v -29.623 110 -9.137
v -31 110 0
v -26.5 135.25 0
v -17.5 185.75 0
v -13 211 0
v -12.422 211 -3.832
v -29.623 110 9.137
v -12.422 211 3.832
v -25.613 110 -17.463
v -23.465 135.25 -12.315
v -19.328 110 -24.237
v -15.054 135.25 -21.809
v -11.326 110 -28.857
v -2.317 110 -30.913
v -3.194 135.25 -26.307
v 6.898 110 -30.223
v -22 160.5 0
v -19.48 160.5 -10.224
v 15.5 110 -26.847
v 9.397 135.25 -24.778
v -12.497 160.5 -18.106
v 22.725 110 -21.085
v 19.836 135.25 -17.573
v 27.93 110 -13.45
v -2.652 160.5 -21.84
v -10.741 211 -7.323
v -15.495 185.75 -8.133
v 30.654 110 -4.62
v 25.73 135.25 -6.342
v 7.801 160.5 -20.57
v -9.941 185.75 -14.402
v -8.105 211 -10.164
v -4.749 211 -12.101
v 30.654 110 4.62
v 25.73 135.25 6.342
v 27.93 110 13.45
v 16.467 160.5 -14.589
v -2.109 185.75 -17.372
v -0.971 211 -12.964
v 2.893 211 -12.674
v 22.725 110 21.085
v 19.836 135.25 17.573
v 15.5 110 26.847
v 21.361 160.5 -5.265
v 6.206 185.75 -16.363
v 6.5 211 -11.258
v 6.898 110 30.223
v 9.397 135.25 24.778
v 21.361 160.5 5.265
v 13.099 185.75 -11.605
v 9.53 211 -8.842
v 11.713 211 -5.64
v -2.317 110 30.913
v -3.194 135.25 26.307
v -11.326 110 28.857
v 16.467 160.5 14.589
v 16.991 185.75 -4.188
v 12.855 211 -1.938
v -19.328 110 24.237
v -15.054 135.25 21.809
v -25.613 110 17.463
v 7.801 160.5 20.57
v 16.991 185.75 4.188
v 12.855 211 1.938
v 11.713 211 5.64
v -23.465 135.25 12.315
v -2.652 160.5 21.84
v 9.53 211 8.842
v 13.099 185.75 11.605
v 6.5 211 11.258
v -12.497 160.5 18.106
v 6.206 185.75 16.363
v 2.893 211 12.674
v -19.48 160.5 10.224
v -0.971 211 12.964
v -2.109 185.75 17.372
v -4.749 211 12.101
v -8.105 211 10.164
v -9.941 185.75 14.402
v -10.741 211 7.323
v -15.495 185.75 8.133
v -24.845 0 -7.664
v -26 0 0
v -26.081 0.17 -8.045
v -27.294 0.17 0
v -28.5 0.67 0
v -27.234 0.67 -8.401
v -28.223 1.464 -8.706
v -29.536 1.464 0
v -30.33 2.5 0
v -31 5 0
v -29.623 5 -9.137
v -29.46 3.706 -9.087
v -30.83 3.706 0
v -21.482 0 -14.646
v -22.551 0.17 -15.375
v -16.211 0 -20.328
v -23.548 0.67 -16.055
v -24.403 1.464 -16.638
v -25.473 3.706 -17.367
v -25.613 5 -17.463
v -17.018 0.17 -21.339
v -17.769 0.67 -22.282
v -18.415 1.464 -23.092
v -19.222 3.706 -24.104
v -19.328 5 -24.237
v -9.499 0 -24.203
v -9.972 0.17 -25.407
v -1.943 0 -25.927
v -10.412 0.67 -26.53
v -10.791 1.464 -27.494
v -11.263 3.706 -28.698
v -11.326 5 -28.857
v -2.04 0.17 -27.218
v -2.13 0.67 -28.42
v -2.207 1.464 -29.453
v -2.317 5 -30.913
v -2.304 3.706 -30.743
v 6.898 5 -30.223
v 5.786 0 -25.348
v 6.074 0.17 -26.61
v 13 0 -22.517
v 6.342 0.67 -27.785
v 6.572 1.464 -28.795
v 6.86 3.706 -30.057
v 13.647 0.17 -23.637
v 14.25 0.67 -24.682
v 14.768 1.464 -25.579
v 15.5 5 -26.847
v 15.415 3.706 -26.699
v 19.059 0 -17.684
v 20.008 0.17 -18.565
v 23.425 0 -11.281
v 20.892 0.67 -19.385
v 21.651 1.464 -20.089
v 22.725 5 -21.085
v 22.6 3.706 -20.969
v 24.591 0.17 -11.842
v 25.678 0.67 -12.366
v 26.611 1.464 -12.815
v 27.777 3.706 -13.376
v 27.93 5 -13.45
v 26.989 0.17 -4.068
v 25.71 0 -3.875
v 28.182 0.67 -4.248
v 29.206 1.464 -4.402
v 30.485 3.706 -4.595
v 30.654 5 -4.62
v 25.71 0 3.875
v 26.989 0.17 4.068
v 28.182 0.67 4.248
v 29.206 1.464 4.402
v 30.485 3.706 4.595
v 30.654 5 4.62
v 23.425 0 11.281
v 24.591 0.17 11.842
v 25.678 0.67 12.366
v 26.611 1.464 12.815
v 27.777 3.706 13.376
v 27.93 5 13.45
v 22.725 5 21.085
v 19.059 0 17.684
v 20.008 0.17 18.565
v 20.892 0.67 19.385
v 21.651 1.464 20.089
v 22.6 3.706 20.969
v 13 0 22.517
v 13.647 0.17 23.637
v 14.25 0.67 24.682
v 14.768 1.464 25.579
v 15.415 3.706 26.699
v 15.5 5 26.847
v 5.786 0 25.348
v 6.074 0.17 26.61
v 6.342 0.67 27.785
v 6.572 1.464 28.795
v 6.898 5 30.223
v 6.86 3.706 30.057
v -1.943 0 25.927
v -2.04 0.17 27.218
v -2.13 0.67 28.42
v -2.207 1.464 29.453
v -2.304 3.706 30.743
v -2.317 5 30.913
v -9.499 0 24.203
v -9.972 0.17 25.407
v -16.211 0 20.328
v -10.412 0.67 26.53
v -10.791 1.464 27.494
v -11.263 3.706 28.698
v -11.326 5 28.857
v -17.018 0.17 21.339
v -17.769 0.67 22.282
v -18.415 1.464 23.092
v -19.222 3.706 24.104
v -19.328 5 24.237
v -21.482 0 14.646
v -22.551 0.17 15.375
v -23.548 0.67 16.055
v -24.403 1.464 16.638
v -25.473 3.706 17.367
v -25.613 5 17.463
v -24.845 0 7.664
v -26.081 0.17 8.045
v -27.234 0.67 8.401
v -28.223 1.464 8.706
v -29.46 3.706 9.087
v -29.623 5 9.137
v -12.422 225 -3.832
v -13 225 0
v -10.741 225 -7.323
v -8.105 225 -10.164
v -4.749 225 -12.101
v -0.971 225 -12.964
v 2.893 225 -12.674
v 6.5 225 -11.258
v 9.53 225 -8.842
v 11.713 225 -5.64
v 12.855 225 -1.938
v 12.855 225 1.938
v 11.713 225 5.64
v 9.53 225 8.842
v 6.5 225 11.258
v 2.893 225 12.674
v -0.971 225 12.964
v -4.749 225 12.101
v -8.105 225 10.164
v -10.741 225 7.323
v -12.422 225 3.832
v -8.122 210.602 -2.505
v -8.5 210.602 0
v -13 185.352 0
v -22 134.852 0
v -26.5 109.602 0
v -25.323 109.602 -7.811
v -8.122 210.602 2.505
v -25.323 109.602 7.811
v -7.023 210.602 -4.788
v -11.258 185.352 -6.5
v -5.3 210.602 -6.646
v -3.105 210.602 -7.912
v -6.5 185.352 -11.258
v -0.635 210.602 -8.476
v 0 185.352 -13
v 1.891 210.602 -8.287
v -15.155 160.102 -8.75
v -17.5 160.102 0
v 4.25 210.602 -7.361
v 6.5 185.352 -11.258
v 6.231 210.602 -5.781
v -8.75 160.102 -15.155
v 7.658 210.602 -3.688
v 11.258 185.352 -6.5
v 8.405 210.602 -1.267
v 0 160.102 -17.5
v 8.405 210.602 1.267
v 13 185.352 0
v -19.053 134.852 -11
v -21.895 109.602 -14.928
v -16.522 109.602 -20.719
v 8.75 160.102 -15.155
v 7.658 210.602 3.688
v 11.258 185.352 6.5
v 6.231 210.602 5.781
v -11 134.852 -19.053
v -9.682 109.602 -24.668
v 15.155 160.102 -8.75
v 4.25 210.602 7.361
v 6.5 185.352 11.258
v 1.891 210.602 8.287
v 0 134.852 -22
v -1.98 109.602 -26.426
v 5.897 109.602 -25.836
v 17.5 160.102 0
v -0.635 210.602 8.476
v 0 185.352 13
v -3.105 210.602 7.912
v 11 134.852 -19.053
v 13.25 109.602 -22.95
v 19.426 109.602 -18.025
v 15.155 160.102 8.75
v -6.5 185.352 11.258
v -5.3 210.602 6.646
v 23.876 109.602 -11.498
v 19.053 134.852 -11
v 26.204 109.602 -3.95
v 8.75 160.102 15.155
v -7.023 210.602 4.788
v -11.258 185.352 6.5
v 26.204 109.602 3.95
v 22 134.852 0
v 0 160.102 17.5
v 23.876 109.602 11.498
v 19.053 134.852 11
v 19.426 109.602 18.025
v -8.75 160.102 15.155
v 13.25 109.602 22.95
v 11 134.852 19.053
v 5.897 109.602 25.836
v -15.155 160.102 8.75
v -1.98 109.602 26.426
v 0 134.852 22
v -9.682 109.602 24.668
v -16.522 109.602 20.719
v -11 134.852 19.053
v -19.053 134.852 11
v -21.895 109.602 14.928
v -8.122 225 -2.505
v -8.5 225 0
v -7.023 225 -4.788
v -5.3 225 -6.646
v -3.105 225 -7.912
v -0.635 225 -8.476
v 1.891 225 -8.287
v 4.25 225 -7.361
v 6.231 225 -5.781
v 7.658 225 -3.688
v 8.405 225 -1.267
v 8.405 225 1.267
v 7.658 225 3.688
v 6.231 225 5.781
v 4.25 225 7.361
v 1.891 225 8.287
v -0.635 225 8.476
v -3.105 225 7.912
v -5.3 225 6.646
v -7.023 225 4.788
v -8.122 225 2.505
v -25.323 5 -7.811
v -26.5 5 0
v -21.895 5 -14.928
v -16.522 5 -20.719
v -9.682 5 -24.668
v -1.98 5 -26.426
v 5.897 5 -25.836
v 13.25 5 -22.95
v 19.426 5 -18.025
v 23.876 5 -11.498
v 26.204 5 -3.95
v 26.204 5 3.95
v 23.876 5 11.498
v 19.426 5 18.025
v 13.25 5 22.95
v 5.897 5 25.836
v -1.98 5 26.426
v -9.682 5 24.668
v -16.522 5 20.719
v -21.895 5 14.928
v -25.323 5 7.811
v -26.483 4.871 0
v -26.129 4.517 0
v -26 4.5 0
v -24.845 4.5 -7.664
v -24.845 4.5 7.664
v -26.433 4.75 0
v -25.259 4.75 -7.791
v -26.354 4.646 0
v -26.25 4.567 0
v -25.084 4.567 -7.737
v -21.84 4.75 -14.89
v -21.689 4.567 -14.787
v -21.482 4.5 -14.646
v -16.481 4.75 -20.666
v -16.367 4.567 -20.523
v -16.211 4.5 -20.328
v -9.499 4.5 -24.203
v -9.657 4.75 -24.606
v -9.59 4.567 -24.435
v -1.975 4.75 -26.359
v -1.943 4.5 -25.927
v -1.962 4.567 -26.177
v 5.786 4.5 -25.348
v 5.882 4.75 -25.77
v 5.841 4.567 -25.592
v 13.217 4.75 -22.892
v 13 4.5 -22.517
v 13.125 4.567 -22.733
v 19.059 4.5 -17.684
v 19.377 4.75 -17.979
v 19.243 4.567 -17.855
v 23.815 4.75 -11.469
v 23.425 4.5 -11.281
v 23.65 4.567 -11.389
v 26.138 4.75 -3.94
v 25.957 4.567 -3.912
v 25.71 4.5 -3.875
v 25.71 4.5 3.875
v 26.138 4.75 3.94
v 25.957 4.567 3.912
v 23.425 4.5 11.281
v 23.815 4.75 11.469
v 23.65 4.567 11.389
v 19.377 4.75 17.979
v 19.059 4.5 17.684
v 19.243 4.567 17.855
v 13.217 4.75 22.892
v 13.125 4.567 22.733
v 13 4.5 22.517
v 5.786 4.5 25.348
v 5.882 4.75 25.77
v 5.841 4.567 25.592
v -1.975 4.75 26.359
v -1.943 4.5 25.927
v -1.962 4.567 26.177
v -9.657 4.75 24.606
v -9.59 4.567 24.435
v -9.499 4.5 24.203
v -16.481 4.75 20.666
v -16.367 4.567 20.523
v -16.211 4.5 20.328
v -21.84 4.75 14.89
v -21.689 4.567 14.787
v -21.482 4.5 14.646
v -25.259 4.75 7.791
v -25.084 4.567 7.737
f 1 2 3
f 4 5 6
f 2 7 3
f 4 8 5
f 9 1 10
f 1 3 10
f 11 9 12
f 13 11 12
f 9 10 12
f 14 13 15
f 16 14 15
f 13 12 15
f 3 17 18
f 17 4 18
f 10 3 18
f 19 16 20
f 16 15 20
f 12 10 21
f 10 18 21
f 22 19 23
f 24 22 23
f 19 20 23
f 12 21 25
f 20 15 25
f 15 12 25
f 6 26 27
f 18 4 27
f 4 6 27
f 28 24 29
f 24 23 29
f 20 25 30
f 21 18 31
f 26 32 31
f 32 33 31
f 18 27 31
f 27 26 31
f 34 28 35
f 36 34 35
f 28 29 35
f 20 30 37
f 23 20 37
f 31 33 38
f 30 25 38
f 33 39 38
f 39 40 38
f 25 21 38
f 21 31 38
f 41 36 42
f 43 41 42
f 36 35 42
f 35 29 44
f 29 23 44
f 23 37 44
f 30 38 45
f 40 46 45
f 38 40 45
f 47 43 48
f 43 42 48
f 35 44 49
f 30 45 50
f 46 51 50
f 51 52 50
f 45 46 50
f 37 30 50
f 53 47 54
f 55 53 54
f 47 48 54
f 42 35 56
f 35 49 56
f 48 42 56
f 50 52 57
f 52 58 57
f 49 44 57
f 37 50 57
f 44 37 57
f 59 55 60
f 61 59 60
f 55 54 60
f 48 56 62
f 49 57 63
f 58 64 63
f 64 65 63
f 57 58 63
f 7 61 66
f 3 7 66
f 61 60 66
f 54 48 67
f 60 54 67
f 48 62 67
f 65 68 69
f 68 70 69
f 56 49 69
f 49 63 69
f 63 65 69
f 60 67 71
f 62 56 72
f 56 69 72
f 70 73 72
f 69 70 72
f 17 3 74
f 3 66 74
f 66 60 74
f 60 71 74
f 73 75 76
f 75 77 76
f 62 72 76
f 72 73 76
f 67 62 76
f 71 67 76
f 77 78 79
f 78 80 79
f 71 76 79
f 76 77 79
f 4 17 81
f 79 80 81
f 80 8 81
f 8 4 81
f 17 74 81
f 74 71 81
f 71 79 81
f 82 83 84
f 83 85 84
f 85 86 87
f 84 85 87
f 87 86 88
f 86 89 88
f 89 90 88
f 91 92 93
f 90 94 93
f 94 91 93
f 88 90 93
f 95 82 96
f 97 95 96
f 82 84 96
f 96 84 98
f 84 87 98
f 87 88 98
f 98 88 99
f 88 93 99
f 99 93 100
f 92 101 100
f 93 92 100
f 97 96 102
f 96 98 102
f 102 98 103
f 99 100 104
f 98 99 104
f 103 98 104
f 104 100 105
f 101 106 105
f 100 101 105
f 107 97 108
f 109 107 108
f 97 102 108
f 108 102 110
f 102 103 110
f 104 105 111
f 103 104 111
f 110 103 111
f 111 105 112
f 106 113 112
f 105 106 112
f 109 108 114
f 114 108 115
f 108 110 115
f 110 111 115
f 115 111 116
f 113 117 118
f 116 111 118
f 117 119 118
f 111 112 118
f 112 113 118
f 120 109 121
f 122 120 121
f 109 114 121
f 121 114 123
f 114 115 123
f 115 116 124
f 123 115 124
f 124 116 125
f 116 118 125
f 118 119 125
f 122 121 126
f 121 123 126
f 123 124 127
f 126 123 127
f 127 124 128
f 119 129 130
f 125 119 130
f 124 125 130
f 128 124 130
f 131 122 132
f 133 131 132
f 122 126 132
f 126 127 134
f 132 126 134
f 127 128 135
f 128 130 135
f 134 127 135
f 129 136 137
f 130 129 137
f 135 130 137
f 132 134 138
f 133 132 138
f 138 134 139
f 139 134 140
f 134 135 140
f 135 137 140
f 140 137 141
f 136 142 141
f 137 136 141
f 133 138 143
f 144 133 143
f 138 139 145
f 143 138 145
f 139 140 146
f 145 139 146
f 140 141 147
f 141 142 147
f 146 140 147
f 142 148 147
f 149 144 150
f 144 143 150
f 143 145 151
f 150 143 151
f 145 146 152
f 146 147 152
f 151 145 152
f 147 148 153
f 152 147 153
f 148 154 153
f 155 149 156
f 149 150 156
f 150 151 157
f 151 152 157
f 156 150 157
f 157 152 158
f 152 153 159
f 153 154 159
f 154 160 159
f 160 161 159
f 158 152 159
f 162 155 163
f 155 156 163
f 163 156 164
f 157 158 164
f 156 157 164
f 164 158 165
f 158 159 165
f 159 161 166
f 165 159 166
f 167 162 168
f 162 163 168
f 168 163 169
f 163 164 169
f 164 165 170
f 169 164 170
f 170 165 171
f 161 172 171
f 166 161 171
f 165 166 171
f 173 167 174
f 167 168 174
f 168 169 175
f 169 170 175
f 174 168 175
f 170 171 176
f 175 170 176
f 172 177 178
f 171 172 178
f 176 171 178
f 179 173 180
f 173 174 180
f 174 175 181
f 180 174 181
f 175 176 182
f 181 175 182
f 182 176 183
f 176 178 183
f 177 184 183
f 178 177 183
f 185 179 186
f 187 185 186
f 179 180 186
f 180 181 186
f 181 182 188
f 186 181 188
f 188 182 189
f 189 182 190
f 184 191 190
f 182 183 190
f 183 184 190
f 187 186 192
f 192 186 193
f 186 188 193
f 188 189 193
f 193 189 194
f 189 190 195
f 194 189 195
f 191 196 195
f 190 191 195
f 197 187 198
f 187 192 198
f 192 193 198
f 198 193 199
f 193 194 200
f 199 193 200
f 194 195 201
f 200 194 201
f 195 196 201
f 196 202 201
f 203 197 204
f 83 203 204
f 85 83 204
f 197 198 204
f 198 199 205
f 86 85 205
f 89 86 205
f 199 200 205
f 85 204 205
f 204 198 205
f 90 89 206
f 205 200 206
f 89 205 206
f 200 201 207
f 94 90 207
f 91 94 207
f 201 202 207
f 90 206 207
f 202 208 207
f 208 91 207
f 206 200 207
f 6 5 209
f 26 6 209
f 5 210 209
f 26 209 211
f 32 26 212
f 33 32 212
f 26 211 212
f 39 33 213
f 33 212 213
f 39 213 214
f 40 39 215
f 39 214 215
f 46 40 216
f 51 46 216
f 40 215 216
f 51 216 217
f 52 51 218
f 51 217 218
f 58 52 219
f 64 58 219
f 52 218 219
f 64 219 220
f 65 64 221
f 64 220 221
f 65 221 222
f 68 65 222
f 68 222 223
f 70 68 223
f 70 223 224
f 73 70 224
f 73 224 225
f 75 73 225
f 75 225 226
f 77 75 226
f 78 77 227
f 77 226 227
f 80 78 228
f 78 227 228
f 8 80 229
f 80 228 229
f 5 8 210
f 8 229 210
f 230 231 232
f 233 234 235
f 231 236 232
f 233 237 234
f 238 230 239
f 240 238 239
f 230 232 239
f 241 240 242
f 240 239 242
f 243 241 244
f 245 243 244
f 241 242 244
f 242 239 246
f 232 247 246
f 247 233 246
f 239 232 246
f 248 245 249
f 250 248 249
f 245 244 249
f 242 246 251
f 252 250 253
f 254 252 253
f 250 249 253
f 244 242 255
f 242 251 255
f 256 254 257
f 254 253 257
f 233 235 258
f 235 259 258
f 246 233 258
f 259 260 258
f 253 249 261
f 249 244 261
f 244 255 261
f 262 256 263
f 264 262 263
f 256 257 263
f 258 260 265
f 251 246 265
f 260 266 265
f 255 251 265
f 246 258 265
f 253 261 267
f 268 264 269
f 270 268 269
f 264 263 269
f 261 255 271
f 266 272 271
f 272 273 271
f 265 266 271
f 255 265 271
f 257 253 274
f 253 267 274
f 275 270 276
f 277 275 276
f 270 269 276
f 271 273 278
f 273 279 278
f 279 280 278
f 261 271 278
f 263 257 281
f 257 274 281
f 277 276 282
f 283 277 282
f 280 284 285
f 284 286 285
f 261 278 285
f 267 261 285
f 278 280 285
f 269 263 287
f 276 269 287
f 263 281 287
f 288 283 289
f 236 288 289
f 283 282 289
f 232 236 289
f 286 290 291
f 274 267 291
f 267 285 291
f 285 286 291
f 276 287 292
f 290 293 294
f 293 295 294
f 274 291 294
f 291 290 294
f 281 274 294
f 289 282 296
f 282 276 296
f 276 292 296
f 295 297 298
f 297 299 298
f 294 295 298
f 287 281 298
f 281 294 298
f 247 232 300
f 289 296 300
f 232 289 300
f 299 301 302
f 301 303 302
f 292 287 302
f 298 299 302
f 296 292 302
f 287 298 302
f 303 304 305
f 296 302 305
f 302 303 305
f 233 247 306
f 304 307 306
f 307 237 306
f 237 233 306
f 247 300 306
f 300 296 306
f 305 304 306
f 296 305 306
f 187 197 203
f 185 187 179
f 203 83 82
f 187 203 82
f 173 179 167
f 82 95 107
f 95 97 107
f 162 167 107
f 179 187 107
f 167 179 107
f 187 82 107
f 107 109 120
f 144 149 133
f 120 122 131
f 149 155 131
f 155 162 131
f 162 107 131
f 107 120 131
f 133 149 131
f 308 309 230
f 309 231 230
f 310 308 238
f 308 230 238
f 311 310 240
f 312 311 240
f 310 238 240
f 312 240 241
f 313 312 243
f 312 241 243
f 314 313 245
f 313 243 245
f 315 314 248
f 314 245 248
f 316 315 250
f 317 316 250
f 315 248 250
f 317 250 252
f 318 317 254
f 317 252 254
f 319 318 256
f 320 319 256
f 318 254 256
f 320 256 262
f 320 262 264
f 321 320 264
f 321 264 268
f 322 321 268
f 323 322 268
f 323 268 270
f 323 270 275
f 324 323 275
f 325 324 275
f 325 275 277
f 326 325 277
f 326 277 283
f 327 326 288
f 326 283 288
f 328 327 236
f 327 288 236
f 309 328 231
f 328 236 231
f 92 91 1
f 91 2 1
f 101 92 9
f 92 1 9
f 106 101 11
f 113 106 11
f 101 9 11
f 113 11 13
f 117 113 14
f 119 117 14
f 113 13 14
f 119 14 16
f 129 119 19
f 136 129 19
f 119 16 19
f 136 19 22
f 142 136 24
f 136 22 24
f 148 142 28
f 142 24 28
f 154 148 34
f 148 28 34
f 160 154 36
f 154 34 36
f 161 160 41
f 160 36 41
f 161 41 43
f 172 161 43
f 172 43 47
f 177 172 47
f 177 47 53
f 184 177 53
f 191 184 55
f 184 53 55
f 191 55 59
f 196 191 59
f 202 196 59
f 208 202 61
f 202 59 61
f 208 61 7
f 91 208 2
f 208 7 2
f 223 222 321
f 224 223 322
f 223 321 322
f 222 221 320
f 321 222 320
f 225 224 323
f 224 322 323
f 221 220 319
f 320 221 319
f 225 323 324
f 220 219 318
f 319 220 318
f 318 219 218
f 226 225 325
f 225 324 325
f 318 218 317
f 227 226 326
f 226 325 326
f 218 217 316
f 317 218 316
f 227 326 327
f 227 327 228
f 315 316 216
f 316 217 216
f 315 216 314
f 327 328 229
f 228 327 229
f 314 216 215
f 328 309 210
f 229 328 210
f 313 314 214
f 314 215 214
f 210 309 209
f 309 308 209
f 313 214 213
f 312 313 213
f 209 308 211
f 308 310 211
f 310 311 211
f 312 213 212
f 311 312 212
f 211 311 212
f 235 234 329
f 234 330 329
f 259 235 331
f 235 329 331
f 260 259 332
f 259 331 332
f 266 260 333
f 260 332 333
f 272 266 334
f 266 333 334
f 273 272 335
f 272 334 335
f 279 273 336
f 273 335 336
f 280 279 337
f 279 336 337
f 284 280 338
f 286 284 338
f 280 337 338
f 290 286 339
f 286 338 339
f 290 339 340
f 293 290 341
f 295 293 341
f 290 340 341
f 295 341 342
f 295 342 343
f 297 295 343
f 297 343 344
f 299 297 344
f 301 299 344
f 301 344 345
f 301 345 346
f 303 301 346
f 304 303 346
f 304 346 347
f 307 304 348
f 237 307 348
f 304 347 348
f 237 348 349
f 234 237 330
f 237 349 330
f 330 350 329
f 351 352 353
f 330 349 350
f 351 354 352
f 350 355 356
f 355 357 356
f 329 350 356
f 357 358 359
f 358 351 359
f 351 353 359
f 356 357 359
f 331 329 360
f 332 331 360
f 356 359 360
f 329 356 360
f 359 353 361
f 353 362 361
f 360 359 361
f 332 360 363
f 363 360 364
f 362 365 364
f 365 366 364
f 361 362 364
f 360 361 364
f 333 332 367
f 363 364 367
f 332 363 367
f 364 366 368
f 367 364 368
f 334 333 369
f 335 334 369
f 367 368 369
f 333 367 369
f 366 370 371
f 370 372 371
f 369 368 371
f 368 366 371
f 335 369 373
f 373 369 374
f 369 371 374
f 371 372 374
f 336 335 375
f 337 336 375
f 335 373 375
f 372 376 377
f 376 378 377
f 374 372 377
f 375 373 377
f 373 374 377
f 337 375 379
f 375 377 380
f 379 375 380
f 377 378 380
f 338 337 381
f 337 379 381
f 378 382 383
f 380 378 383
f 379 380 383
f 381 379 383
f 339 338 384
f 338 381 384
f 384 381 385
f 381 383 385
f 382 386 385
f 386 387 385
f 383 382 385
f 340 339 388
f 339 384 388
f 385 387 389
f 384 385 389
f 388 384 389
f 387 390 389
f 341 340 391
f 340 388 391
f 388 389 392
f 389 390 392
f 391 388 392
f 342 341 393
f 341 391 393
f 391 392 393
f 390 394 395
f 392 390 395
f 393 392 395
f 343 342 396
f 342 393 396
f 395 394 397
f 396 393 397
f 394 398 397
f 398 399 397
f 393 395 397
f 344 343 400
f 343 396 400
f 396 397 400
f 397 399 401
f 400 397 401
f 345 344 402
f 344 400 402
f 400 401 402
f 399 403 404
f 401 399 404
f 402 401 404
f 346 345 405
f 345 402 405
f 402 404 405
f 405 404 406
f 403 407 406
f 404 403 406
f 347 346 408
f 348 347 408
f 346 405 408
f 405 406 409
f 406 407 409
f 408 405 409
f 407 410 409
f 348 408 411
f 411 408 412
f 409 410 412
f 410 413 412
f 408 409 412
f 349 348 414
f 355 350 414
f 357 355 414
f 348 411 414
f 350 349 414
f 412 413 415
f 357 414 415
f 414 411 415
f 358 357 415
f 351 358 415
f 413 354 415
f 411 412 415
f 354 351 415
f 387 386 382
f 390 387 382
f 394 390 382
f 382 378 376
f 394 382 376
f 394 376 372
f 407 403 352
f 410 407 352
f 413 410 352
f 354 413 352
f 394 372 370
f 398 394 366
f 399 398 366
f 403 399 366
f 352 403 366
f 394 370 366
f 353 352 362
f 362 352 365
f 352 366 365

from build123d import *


with BuildPart() as part:
    # Schizzo1 → Rivoluzione1 (revolve)
    with BuildSketch(Plane.XY):
        with BuildLine():
            Line((0, 0), (-26, 0))
            ThreePointArc((-26, 0), (-29.535533906, 1.464466094), (-31, 5))
            Line((-31, 5), (-31, 110))
            Line((-31, 110), (-13, 211))
            Line((-13, 211), (-13, 225))
            Line((-13, 225), (-8.5, 225))
            Line((-8.5, 225), (-8.5, 220.5))
            Line((-8.5, 220.5), (-8.5, 210.602144339))
            Line((-8.5, 210.602144339), (-26.5, 109.602144339))
            Line((-26.5, 109.602144339), (-26.5, 5))
            ThreePointArc((-26.5, 5), (-26.353553391, 4.646446609), (-26, 4.5))
            Line((-26, 4.5), (-4.5, 4.5))
            Line((-4.5, 4.5), (0, 4.5))
            Line((0, 4.5), (0, 0))
        make_face()
    revolve(axis=Axis((0, 225, 0), (0, -1, 0)))


solid = part.part
